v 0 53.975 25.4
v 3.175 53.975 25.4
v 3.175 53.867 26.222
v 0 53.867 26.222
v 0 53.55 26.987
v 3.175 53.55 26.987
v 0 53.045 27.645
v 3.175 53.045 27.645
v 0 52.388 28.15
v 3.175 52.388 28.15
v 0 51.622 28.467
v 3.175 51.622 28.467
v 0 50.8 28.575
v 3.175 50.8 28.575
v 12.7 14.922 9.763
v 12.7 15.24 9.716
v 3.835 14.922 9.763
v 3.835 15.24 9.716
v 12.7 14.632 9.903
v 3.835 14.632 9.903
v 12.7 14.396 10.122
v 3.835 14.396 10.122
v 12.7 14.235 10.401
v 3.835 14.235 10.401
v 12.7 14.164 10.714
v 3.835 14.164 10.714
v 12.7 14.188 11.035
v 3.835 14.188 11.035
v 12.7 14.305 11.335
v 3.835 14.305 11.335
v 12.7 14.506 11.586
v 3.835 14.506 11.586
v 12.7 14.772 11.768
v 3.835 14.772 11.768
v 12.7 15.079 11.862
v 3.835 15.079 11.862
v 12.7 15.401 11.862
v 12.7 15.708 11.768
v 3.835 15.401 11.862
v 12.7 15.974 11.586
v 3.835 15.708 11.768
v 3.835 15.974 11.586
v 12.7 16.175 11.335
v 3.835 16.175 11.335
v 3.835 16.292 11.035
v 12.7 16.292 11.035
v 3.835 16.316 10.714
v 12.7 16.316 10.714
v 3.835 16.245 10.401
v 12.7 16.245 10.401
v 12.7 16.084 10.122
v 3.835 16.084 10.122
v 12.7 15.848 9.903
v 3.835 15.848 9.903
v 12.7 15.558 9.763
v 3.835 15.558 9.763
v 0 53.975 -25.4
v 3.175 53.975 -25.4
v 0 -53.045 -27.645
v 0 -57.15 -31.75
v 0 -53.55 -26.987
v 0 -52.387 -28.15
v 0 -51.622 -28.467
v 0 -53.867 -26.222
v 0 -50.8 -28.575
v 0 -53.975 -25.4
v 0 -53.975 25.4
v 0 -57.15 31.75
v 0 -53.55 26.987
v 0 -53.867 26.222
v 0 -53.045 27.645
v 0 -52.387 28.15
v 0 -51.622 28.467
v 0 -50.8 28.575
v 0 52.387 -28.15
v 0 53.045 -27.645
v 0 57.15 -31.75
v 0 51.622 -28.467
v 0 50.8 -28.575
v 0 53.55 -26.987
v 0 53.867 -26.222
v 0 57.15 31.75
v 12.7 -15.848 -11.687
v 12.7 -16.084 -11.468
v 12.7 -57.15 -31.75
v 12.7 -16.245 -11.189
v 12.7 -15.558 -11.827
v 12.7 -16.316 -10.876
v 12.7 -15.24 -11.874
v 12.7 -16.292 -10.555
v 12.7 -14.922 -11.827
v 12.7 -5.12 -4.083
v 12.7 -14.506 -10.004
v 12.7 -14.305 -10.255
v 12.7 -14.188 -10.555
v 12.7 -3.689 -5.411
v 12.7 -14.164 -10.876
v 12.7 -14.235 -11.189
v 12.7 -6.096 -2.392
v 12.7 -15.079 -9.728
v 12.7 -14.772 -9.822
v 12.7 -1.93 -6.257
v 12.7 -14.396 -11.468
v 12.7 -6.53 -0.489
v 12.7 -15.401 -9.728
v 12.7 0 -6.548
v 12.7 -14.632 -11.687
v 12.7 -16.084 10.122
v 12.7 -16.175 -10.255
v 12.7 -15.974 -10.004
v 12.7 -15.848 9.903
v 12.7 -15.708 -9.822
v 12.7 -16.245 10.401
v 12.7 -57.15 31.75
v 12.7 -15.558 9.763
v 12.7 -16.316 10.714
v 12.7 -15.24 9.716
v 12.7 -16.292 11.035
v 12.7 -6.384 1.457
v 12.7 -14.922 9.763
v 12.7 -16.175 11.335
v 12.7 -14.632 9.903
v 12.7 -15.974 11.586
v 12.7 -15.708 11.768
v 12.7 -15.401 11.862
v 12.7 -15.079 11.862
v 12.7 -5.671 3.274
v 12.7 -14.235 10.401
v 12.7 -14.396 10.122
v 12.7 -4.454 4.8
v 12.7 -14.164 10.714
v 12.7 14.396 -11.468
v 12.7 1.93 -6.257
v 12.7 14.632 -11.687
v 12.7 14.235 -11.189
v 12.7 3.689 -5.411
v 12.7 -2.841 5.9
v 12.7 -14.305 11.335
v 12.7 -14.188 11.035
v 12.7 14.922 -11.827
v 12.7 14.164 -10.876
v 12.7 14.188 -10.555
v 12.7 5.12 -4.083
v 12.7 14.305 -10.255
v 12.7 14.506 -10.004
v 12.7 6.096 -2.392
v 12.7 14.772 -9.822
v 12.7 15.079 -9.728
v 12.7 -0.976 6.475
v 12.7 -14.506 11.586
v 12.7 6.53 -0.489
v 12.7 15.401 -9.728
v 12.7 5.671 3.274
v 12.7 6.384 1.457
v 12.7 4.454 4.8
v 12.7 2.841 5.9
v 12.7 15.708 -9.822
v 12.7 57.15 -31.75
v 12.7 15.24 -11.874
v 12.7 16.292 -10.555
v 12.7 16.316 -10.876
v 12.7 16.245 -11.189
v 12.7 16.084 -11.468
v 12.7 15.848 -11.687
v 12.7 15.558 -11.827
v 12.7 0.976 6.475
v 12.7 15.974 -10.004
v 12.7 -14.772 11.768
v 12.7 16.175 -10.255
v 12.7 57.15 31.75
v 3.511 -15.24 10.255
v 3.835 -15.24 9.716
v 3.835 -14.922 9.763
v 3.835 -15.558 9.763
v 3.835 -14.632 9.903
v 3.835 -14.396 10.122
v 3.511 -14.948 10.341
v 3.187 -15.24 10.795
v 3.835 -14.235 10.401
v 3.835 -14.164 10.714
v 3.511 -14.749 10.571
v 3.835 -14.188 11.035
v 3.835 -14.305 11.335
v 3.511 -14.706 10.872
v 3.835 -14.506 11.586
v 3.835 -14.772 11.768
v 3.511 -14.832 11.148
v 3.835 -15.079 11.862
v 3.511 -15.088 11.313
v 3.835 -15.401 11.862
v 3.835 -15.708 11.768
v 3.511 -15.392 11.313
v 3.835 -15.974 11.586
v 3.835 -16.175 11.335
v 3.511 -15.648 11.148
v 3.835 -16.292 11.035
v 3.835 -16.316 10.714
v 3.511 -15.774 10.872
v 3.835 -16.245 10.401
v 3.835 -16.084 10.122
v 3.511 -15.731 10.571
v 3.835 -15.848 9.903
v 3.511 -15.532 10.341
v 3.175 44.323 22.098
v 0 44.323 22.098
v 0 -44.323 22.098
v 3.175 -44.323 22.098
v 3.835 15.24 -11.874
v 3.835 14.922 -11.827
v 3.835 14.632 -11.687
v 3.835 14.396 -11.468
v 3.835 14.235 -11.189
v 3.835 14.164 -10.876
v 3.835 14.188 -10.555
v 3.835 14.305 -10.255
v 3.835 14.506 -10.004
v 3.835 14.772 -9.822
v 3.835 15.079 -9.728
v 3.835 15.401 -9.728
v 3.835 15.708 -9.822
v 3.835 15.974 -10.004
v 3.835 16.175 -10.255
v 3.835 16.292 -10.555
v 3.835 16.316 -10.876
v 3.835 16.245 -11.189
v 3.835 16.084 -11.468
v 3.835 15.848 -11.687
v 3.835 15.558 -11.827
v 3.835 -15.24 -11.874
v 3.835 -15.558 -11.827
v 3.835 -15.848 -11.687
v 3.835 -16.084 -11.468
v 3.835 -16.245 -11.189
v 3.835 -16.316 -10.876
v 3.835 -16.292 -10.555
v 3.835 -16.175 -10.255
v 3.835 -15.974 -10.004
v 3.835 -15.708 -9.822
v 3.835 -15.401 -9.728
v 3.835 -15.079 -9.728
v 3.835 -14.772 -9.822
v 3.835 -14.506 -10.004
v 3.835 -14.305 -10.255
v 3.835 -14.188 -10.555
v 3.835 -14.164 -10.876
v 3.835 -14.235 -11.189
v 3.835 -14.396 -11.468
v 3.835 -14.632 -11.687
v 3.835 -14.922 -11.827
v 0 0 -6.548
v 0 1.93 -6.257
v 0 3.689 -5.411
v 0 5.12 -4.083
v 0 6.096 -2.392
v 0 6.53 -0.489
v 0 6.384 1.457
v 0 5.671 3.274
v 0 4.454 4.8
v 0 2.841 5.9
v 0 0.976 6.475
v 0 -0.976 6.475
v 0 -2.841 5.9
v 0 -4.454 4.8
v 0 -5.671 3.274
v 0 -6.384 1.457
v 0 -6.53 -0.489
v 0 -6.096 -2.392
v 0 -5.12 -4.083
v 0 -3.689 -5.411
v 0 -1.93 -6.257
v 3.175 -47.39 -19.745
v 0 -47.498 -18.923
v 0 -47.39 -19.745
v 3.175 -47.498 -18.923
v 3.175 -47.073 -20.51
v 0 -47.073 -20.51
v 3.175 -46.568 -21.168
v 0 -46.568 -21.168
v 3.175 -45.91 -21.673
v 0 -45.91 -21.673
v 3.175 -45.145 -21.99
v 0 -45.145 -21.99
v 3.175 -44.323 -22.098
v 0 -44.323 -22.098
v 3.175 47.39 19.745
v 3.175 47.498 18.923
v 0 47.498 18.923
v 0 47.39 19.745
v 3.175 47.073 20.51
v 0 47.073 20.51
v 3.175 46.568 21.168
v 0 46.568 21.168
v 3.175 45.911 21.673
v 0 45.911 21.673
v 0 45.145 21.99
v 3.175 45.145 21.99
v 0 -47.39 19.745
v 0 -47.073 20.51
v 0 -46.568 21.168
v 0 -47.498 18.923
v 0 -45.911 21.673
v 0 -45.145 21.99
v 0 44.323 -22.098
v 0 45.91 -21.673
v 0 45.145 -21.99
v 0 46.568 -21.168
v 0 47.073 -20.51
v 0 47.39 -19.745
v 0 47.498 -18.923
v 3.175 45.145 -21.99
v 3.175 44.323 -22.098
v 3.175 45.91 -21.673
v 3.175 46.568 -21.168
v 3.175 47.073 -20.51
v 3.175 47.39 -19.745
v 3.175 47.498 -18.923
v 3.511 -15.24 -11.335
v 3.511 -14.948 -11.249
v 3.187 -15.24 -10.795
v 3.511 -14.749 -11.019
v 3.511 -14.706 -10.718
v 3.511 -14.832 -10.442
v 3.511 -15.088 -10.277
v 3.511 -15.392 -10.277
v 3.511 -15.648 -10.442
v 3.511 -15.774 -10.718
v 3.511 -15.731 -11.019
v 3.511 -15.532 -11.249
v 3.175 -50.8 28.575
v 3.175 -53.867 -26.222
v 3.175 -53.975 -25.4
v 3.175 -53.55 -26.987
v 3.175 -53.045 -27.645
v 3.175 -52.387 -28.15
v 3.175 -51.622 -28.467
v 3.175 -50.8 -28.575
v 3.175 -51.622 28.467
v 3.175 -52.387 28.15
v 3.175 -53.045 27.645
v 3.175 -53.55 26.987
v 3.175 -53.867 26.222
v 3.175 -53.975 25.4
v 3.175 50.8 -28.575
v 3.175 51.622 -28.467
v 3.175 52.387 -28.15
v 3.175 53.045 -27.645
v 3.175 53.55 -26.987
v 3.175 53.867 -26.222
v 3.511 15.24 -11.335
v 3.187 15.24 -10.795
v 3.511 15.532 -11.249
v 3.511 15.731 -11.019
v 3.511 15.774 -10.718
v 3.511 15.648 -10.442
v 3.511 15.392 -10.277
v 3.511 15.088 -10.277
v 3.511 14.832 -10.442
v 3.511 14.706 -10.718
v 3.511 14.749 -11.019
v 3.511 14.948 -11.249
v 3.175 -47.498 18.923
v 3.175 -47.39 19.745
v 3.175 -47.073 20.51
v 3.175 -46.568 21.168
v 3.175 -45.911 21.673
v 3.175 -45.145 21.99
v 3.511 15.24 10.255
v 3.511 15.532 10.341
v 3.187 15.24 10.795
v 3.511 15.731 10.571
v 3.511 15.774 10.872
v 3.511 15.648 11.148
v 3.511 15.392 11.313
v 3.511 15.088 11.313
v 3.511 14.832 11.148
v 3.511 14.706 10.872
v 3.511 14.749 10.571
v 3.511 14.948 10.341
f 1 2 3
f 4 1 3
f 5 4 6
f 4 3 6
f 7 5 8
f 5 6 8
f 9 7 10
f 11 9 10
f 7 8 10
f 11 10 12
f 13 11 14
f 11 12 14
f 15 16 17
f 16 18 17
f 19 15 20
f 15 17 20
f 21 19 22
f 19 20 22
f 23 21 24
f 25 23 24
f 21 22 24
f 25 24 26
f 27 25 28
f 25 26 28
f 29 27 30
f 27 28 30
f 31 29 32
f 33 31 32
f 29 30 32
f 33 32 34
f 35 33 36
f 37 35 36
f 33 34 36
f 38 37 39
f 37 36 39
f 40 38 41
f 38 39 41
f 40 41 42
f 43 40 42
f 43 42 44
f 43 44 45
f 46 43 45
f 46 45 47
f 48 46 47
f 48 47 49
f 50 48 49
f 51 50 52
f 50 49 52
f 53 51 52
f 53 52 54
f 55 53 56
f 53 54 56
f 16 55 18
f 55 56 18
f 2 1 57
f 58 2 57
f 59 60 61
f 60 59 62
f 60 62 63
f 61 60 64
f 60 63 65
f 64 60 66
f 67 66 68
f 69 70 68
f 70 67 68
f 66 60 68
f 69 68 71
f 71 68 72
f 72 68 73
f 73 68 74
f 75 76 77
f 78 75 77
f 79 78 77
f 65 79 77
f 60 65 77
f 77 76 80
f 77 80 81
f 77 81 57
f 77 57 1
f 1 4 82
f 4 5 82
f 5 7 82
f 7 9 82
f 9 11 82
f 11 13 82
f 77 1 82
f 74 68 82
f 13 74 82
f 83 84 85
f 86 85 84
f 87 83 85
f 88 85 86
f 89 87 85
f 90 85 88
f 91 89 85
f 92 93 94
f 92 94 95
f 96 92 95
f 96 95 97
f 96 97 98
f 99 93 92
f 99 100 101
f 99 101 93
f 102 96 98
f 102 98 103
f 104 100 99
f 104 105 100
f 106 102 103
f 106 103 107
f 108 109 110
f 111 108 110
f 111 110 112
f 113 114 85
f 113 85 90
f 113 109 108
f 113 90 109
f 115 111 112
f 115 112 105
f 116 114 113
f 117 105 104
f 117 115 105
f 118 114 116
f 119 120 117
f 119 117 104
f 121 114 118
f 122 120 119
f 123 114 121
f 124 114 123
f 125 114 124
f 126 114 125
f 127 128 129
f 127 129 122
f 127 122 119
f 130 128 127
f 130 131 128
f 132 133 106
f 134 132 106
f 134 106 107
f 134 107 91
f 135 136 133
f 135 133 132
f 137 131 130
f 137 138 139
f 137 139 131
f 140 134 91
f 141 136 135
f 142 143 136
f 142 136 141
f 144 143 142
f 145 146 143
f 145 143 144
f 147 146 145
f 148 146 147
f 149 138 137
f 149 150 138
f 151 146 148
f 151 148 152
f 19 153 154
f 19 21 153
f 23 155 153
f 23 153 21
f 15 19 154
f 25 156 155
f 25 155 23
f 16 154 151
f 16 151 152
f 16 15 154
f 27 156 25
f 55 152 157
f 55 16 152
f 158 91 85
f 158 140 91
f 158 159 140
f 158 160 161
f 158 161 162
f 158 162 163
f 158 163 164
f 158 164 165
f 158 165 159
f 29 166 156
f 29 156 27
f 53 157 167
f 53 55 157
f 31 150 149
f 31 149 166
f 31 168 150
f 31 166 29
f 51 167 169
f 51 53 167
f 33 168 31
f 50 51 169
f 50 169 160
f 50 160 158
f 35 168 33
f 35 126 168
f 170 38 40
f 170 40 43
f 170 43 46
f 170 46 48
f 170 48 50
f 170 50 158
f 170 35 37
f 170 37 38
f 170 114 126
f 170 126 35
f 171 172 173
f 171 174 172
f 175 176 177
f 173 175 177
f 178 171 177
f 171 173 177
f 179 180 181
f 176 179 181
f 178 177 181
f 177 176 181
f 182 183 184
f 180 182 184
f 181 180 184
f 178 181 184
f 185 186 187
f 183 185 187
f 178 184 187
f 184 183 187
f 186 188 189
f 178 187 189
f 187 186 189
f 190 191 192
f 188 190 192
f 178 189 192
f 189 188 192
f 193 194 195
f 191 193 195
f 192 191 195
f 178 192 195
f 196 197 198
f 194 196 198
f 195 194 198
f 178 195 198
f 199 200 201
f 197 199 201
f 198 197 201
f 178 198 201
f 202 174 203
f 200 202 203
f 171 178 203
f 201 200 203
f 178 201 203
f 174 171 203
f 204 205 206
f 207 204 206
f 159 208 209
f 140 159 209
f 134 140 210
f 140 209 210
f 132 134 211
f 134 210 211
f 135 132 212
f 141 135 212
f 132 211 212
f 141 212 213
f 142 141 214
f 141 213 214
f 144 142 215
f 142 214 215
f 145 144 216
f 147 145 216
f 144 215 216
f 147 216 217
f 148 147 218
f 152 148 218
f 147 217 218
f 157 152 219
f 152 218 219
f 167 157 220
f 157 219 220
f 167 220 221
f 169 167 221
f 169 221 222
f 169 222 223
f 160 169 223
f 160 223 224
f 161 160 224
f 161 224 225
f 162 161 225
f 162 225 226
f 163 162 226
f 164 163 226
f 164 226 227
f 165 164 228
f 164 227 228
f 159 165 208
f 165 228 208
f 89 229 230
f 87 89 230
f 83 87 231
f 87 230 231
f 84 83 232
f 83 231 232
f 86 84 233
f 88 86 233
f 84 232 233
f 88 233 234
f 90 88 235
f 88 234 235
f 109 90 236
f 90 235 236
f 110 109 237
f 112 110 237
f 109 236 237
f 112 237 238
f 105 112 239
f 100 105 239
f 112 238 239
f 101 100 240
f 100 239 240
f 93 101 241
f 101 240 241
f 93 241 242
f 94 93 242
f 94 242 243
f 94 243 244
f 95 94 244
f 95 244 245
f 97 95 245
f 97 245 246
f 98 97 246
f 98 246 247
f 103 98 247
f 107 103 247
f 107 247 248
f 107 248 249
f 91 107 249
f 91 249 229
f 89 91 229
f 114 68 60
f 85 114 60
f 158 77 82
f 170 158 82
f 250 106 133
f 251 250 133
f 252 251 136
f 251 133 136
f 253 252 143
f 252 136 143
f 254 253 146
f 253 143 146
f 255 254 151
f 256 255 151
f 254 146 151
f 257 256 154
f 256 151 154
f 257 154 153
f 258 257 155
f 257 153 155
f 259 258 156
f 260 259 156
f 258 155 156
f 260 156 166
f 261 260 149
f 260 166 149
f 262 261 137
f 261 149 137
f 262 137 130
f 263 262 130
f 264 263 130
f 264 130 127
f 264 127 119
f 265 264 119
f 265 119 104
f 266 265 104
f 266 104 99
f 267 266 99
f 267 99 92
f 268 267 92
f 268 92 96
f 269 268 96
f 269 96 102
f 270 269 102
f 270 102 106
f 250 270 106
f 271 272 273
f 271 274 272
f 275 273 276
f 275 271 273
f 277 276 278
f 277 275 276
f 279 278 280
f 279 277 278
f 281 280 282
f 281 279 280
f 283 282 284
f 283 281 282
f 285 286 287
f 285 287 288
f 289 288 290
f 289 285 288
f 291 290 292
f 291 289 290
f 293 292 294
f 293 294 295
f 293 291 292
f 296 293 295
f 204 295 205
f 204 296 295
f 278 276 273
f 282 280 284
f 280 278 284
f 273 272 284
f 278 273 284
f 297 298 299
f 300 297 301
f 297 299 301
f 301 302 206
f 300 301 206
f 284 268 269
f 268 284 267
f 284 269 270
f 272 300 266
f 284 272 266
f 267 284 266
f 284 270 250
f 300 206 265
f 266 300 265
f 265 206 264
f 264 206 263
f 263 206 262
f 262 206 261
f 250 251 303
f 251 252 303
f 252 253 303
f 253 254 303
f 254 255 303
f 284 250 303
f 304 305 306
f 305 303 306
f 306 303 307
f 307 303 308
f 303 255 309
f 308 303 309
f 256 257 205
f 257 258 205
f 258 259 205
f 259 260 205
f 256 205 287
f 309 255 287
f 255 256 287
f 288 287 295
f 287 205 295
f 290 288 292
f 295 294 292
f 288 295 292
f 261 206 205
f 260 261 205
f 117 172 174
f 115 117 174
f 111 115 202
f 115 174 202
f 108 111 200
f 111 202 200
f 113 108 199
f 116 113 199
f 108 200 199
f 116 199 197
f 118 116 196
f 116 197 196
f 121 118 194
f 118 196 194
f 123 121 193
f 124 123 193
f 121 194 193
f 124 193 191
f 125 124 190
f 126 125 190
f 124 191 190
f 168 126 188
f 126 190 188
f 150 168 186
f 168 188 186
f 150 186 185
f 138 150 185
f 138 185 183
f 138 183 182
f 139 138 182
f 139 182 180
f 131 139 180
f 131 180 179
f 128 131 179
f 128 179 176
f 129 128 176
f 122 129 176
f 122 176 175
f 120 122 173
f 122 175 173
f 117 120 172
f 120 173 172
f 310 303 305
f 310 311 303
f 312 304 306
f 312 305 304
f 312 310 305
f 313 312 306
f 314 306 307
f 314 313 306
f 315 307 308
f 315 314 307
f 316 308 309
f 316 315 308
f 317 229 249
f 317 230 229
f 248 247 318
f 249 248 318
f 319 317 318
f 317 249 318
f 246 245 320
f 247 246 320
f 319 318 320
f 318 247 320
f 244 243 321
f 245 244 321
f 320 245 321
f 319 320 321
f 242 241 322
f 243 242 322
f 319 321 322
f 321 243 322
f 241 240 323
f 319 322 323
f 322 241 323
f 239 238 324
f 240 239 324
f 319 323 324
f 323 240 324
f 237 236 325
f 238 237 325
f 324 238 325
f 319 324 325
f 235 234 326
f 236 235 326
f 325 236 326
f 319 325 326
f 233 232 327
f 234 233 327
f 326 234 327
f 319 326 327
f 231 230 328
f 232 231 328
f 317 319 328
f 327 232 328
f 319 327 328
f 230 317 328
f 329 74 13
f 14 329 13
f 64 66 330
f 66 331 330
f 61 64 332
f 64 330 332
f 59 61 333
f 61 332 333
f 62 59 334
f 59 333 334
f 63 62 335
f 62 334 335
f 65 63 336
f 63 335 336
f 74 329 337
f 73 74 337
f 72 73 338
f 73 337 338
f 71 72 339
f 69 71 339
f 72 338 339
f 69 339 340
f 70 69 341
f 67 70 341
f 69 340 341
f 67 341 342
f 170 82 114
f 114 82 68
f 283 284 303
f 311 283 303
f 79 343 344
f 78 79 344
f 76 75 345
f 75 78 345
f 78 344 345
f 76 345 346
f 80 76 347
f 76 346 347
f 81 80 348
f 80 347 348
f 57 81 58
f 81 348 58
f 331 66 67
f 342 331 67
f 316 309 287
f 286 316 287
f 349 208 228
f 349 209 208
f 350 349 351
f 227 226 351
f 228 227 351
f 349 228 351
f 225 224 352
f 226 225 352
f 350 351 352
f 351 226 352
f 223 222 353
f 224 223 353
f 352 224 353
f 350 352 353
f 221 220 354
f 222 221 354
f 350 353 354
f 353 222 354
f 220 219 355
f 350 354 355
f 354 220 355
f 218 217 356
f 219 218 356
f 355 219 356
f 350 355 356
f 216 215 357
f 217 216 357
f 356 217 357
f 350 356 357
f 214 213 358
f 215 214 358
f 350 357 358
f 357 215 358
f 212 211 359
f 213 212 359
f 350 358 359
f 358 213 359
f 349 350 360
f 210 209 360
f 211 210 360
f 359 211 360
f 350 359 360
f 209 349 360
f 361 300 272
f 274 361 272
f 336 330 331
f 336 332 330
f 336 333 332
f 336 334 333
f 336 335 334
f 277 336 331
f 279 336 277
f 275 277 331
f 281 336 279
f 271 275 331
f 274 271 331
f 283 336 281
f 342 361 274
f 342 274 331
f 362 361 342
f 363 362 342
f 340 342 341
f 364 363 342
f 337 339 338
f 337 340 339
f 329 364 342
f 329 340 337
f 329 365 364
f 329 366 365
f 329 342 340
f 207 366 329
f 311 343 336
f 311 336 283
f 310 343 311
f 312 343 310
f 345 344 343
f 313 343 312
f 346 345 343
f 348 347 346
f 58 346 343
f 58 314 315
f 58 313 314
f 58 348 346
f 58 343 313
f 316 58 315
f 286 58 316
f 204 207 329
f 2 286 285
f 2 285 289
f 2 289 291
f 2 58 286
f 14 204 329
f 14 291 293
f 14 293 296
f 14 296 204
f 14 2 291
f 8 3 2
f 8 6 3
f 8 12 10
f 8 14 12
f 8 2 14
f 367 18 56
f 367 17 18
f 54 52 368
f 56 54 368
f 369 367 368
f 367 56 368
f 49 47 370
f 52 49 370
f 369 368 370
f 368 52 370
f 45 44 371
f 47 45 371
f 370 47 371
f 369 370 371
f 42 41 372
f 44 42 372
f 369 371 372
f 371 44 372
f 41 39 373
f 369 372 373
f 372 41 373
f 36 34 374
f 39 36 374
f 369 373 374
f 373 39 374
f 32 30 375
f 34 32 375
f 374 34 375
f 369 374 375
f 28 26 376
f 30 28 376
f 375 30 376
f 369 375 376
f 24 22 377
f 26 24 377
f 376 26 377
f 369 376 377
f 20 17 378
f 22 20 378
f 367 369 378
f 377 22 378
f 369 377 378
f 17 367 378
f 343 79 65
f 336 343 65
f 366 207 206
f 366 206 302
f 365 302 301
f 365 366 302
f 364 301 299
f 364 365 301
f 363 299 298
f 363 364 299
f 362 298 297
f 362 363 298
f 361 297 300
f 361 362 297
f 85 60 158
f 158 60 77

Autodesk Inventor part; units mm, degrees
ref_plane "YZ Plane" through (0, 0, 0) normal (1, 0, 0) x (0, 1, 0)
ref_plane "XZ Plane" through (0, 0, 0) normal (0, 1, 0) x (-1, 0, 0)
ref_plane "XY Plane" through (0, 0, 0) normal (0, 0, 1) x (1, 0, 0)
sketch "Sketch1" plane through (0, 0, 0) normal (1, 0, 0) x (0, 1, 0)
  line L0 (57.15, 31.75) -> (-57.15, 31.75)
  line L1 (-57.15, 31.75) -> (-57.15, -31.75)
  line L2 (-57.15, -31.75) -> (57.15, -31.75)
  line L3 (57.15, -31.75) -> (57.15, 31.75)
  line L4 (-50.8, 25.4) -> (50.8, 25.4)
  line L5 (50.8, 25.4) -> (50.8, -25.4)
  line L6 (50.8, -25.4) -> (-50.8, -25.4)
  line L7 (-50.8, -25.4) -> (-50.8, 25.4)
  point P0 (0, 0)
  point P1 (0, -31.75)
  point P2 (57.15, 0)
  point P3 (0, 25.4)
  point P4 (-50.8, 0)
  dimension "d0" = 63.5
  dimension "d1" = 114.3
  dimension "d14" = 50.8
  dimension "d15" = 101.6
extrude "Extrusion1" add sketch "Sketch1" along normal blind 12.7 contours L3 L2 L1 L0 | L4 L5 L6 L7
sketch "Sketch2" plane through (12.7, 0, 0) normal (1, 0, 0) x (0, 0, -1)
  line L0 (-10.795, -15.24) -> (10.795, 15.24) construction
  line L1 (-10.795, 15.24) -> (10.795, -15.24) construction
  circle A0 centre (0, 0) radius 6.5484
  dimension "d5" = 30.48
  dimension "d12" = 13.0969
  dimension "d13" = 21.59
sketch "Sketch3" plane through (0, 0, 0) normal (-1, 0, 0) x (0, 0, 1)
  line L0 (-28.575, -53.975) -> (28.575, -53.975)
  line L1 (28.575, -53.975) -> (28.575, 53.975)
  line L2 (28.575, 53.975) -> (-28.575, 53.975)
  line L3 (-28.575, 53.975) -> (-28.575, -53.975)
  line L4 (22.098, 47.498) -> (22.098, -47.498)
  line L5 (22.098, -47.498) -> (-22.098, -47.498)
  line L6 (-22.098, -47.498) -> (-22.098, 47.498)
  line L7 (-22.098, 47.498) -> (22.098, 47.498)
  point P0 (0, 0)
  point P1 (0, -53.975)
  point P2 (-28.575, 0)
  point P3 (0, 0)
  point P4 (28.575, 0)
  point P5 (0, 53.975)
  dimension "d16" = 107.95
  dimension "d17" = 57.15
  dimension "d31" = 6.477
extrude "Extrusion3" cut sketch "Sketch3" against normal blind 3.175
extrude "Extrusion4" cut sketch "Sketch2" against normal through all
hole "Hole1" at (12.7, -15.24, 10.795) at (12.7, 15.24, 10.795) at (12.7, 15.24, -10.795) at (12.7, -15.24, -10.795) direction (-1, 0, 0) diameter 2.159 depth 8.8646 tip angle 118
fillet "Fillet1" radius 3.175 8 edges at (1.5875, 53.975, 28.575) (1.5875, -47.498, 22.098) (1.5875, -47.498, -22.098) (1.5875, -53.975, -28.575) (1.5875, 47.498, -22.098) (1.5875, -53.975, 28.575) (1.5875, 53.975, -28.575) (1.5875, 47.498, 22.098)
properties part number "plate" material "Aluminum 6061"
